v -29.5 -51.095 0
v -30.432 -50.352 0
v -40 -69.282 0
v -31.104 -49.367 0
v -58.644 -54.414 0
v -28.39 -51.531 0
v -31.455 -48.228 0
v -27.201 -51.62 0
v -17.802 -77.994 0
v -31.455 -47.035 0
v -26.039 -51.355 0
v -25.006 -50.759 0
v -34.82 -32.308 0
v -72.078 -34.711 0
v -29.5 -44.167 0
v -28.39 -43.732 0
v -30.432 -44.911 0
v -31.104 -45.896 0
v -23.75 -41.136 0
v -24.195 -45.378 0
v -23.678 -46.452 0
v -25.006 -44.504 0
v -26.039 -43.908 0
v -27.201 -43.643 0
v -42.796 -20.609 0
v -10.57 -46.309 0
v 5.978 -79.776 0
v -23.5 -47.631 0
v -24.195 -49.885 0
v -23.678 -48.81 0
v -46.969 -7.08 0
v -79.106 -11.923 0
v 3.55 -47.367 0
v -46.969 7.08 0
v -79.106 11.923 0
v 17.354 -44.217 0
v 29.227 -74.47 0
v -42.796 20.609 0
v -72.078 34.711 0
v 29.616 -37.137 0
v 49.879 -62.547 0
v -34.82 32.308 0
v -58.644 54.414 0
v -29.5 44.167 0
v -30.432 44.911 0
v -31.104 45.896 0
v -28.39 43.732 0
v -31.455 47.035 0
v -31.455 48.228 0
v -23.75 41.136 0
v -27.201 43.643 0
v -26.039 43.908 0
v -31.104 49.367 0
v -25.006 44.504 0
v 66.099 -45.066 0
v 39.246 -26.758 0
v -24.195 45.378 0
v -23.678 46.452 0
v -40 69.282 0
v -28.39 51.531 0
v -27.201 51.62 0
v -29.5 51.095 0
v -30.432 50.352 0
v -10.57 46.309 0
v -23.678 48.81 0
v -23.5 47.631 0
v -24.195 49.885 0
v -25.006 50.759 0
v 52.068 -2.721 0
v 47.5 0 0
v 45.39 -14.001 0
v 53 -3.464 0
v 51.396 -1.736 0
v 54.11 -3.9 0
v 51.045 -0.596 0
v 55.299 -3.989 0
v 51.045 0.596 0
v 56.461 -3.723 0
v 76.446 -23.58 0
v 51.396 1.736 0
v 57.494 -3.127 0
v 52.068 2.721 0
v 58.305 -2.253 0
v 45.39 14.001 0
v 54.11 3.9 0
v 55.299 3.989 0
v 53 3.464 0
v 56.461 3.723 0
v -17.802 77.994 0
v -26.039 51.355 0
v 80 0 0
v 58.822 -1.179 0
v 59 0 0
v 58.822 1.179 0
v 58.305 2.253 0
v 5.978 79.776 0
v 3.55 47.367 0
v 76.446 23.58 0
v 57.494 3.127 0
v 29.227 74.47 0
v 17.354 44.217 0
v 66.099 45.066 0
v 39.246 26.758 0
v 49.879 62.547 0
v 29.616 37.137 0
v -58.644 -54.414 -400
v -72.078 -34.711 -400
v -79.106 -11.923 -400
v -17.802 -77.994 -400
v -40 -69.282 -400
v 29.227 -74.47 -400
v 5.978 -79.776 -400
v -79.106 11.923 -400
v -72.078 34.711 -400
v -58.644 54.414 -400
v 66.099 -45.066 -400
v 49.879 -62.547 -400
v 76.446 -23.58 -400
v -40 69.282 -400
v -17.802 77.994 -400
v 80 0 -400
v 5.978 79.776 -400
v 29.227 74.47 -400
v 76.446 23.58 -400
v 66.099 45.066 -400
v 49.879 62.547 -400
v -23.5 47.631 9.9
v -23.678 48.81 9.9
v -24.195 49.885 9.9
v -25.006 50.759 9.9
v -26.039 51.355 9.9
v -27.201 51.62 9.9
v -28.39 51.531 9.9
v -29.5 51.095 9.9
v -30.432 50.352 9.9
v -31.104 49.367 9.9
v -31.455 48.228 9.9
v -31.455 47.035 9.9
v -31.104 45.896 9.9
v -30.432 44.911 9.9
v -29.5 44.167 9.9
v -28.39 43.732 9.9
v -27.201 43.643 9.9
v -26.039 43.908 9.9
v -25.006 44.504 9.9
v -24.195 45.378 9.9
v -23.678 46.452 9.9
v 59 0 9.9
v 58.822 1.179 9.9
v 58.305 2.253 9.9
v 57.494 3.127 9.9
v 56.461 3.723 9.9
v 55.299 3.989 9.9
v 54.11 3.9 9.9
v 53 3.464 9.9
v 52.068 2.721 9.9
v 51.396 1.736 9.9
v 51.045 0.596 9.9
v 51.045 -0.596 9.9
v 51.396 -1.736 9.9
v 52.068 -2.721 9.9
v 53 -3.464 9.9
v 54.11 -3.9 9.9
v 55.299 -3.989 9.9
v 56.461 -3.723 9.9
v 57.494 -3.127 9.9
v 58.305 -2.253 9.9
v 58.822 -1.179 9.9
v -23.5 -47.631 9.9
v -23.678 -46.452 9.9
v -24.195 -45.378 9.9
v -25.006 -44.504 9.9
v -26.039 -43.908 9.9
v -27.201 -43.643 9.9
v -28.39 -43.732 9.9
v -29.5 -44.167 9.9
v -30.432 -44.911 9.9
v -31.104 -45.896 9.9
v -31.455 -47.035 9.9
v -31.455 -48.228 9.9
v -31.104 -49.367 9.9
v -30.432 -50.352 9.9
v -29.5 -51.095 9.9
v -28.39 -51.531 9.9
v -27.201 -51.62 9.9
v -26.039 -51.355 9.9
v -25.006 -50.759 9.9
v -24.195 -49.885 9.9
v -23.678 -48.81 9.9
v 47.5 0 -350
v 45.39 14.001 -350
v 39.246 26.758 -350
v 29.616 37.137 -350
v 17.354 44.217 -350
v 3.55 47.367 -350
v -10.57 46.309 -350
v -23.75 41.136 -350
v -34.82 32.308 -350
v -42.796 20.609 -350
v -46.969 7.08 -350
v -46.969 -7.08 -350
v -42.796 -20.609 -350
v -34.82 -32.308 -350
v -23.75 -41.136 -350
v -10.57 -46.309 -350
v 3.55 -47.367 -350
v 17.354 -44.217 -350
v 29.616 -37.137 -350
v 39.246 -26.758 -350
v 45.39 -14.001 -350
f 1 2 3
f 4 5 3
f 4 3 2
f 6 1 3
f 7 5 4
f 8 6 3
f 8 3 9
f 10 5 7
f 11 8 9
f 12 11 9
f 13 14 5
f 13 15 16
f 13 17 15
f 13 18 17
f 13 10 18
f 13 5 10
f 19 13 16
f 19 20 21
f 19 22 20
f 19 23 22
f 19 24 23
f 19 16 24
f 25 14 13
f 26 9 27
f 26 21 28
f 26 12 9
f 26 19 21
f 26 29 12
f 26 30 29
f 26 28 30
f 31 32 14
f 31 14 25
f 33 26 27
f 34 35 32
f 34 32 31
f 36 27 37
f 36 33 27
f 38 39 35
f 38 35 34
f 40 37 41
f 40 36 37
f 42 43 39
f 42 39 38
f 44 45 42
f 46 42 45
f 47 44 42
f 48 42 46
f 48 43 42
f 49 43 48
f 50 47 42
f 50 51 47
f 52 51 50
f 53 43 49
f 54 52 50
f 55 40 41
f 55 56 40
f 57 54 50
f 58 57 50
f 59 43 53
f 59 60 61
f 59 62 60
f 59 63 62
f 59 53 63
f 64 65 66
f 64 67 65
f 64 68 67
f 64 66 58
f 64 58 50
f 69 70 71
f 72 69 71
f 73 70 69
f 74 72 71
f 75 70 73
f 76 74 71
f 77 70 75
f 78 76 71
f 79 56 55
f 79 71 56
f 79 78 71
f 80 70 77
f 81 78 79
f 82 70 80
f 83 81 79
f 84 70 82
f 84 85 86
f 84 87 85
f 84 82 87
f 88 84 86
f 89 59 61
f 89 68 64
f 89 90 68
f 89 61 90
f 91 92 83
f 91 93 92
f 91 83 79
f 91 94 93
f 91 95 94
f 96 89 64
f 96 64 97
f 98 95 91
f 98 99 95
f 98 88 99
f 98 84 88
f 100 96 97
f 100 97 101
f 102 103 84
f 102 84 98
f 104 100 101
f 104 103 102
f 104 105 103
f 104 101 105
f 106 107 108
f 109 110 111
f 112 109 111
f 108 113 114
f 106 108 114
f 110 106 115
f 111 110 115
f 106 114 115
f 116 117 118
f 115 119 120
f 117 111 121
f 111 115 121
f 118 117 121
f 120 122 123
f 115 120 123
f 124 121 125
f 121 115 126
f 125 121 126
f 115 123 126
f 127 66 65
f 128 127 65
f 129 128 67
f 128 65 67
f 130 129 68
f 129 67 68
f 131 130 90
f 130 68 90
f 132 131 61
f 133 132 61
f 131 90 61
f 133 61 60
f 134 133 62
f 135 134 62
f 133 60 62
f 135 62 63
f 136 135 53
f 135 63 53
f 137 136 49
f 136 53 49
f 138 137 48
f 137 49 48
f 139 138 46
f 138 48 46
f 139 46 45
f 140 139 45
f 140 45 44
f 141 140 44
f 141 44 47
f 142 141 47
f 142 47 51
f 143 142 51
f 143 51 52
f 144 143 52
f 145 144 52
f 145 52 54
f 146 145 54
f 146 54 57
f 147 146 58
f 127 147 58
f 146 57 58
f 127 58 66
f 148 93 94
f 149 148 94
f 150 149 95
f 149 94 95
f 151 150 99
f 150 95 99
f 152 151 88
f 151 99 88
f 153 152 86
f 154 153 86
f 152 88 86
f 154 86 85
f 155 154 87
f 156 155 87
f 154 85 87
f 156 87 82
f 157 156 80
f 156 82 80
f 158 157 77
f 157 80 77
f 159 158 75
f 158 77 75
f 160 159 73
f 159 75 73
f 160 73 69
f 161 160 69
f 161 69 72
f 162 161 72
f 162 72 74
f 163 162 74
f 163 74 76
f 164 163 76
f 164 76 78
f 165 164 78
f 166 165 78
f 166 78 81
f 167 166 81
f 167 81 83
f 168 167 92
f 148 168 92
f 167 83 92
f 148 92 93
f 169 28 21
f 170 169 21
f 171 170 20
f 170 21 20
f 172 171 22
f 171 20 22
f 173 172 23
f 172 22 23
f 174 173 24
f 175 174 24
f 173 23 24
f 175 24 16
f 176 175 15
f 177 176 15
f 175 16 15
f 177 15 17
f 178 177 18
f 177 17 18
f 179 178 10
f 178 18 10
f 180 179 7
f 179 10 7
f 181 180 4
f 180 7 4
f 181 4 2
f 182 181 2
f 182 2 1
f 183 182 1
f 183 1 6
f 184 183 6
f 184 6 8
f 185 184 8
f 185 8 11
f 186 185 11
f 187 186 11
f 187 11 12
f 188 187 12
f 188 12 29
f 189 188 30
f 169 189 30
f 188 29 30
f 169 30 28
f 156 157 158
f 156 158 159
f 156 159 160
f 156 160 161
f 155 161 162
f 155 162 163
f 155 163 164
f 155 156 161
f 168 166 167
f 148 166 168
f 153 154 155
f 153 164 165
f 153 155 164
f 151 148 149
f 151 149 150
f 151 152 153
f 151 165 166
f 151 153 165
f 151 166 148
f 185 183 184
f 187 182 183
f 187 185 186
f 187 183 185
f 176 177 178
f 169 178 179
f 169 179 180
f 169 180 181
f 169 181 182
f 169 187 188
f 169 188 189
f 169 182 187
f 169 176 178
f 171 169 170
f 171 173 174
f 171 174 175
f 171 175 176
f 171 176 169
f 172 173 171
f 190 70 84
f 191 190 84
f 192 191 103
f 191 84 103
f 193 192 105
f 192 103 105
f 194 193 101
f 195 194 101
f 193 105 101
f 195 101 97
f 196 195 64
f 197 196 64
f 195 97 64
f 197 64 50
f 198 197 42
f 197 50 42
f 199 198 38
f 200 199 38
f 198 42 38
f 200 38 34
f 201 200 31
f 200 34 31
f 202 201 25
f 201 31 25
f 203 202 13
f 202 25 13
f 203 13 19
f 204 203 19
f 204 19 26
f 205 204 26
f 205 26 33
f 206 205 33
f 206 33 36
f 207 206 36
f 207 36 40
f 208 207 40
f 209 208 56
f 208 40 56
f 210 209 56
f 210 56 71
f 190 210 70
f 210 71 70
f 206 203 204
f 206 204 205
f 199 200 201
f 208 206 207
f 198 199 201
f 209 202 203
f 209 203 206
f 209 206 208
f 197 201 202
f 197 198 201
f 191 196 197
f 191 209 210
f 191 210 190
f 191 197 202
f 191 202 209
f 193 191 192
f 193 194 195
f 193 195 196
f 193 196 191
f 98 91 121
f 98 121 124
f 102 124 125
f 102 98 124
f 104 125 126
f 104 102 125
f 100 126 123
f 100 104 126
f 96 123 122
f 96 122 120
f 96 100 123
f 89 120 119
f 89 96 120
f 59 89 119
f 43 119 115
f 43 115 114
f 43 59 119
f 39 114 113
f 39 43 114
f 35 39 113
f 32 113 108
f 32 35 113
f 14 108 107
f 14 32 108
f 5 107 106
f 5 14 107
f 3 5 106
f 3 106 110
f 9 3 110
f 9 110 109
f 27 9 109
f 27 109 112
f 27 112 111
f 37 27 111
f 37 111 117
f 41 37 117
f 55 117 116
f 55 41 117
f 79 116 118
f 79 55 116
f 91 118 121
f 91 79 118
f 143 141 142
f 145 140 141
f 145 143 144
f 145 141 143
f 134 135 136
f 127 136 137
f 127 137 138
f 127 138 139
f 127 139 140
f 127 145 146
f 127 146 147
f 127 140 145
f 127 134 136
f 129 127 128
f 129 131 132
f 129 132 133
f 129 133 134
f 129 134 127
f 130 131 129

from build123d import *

# Parameters (mm, degrees)
F0_R     = 80
F0_R_2   = 4
F0_R_3   = 47.5
F1_DEPTH = 400
F2_DEPTH = 9.9
F3_DEPTH = 350


with BuildPart() as f1:
    # F0 (on Top) → F1 (new body)
    with BuildSketch(Plane.XY):
        Circle(F0_R)
        with Locations((-27.5, -47.631397)):
            Circle(F0_R_2, mode=Mode.SUBTRACT)
        with Locations((-27.5, 47.631397)):
            Circle(F0_R_2, mode=Mode.SUBTRACT)
        Circle(F0_R_3, mode=Mode.SUBTRACT)
        with Locations((55, 0)):
            Circle(F0_R_2, mode=Mode.SUBTRACT)
        Circle(F0_R_3)
        with Locations((-27.5, 47.631397)):
            Circle(F0_R_2)
        with Locations((55, 0)):
            Circle(F0_R_2)
        with Locations((-27.5, -47.631397)):
            Circle(F0_R_2)
    extrude(amount=-F1_DEPTH)

    # F0 (on Top) → F2 (join)
    with BuildSketch(Plane.XY):
        with Locations((-27.5, -47.631397)):
            Circle(F0_R_2)
        with Locations((55, 0)):
            Circle(F0_R_2)
        with Locations((-27.5, 47.631397)):
            Circle(F0_R_2)
    extrude(amount=F2_DEPTH)

    # F0 (on Top) → F3 (cut)
    with BuildSketch(Plane.XY):
        Circle(F0_R_3)
    extrude(amount=-F3_DEPTH, mode=Mode.SUBTRACT)


solid = f1.part
